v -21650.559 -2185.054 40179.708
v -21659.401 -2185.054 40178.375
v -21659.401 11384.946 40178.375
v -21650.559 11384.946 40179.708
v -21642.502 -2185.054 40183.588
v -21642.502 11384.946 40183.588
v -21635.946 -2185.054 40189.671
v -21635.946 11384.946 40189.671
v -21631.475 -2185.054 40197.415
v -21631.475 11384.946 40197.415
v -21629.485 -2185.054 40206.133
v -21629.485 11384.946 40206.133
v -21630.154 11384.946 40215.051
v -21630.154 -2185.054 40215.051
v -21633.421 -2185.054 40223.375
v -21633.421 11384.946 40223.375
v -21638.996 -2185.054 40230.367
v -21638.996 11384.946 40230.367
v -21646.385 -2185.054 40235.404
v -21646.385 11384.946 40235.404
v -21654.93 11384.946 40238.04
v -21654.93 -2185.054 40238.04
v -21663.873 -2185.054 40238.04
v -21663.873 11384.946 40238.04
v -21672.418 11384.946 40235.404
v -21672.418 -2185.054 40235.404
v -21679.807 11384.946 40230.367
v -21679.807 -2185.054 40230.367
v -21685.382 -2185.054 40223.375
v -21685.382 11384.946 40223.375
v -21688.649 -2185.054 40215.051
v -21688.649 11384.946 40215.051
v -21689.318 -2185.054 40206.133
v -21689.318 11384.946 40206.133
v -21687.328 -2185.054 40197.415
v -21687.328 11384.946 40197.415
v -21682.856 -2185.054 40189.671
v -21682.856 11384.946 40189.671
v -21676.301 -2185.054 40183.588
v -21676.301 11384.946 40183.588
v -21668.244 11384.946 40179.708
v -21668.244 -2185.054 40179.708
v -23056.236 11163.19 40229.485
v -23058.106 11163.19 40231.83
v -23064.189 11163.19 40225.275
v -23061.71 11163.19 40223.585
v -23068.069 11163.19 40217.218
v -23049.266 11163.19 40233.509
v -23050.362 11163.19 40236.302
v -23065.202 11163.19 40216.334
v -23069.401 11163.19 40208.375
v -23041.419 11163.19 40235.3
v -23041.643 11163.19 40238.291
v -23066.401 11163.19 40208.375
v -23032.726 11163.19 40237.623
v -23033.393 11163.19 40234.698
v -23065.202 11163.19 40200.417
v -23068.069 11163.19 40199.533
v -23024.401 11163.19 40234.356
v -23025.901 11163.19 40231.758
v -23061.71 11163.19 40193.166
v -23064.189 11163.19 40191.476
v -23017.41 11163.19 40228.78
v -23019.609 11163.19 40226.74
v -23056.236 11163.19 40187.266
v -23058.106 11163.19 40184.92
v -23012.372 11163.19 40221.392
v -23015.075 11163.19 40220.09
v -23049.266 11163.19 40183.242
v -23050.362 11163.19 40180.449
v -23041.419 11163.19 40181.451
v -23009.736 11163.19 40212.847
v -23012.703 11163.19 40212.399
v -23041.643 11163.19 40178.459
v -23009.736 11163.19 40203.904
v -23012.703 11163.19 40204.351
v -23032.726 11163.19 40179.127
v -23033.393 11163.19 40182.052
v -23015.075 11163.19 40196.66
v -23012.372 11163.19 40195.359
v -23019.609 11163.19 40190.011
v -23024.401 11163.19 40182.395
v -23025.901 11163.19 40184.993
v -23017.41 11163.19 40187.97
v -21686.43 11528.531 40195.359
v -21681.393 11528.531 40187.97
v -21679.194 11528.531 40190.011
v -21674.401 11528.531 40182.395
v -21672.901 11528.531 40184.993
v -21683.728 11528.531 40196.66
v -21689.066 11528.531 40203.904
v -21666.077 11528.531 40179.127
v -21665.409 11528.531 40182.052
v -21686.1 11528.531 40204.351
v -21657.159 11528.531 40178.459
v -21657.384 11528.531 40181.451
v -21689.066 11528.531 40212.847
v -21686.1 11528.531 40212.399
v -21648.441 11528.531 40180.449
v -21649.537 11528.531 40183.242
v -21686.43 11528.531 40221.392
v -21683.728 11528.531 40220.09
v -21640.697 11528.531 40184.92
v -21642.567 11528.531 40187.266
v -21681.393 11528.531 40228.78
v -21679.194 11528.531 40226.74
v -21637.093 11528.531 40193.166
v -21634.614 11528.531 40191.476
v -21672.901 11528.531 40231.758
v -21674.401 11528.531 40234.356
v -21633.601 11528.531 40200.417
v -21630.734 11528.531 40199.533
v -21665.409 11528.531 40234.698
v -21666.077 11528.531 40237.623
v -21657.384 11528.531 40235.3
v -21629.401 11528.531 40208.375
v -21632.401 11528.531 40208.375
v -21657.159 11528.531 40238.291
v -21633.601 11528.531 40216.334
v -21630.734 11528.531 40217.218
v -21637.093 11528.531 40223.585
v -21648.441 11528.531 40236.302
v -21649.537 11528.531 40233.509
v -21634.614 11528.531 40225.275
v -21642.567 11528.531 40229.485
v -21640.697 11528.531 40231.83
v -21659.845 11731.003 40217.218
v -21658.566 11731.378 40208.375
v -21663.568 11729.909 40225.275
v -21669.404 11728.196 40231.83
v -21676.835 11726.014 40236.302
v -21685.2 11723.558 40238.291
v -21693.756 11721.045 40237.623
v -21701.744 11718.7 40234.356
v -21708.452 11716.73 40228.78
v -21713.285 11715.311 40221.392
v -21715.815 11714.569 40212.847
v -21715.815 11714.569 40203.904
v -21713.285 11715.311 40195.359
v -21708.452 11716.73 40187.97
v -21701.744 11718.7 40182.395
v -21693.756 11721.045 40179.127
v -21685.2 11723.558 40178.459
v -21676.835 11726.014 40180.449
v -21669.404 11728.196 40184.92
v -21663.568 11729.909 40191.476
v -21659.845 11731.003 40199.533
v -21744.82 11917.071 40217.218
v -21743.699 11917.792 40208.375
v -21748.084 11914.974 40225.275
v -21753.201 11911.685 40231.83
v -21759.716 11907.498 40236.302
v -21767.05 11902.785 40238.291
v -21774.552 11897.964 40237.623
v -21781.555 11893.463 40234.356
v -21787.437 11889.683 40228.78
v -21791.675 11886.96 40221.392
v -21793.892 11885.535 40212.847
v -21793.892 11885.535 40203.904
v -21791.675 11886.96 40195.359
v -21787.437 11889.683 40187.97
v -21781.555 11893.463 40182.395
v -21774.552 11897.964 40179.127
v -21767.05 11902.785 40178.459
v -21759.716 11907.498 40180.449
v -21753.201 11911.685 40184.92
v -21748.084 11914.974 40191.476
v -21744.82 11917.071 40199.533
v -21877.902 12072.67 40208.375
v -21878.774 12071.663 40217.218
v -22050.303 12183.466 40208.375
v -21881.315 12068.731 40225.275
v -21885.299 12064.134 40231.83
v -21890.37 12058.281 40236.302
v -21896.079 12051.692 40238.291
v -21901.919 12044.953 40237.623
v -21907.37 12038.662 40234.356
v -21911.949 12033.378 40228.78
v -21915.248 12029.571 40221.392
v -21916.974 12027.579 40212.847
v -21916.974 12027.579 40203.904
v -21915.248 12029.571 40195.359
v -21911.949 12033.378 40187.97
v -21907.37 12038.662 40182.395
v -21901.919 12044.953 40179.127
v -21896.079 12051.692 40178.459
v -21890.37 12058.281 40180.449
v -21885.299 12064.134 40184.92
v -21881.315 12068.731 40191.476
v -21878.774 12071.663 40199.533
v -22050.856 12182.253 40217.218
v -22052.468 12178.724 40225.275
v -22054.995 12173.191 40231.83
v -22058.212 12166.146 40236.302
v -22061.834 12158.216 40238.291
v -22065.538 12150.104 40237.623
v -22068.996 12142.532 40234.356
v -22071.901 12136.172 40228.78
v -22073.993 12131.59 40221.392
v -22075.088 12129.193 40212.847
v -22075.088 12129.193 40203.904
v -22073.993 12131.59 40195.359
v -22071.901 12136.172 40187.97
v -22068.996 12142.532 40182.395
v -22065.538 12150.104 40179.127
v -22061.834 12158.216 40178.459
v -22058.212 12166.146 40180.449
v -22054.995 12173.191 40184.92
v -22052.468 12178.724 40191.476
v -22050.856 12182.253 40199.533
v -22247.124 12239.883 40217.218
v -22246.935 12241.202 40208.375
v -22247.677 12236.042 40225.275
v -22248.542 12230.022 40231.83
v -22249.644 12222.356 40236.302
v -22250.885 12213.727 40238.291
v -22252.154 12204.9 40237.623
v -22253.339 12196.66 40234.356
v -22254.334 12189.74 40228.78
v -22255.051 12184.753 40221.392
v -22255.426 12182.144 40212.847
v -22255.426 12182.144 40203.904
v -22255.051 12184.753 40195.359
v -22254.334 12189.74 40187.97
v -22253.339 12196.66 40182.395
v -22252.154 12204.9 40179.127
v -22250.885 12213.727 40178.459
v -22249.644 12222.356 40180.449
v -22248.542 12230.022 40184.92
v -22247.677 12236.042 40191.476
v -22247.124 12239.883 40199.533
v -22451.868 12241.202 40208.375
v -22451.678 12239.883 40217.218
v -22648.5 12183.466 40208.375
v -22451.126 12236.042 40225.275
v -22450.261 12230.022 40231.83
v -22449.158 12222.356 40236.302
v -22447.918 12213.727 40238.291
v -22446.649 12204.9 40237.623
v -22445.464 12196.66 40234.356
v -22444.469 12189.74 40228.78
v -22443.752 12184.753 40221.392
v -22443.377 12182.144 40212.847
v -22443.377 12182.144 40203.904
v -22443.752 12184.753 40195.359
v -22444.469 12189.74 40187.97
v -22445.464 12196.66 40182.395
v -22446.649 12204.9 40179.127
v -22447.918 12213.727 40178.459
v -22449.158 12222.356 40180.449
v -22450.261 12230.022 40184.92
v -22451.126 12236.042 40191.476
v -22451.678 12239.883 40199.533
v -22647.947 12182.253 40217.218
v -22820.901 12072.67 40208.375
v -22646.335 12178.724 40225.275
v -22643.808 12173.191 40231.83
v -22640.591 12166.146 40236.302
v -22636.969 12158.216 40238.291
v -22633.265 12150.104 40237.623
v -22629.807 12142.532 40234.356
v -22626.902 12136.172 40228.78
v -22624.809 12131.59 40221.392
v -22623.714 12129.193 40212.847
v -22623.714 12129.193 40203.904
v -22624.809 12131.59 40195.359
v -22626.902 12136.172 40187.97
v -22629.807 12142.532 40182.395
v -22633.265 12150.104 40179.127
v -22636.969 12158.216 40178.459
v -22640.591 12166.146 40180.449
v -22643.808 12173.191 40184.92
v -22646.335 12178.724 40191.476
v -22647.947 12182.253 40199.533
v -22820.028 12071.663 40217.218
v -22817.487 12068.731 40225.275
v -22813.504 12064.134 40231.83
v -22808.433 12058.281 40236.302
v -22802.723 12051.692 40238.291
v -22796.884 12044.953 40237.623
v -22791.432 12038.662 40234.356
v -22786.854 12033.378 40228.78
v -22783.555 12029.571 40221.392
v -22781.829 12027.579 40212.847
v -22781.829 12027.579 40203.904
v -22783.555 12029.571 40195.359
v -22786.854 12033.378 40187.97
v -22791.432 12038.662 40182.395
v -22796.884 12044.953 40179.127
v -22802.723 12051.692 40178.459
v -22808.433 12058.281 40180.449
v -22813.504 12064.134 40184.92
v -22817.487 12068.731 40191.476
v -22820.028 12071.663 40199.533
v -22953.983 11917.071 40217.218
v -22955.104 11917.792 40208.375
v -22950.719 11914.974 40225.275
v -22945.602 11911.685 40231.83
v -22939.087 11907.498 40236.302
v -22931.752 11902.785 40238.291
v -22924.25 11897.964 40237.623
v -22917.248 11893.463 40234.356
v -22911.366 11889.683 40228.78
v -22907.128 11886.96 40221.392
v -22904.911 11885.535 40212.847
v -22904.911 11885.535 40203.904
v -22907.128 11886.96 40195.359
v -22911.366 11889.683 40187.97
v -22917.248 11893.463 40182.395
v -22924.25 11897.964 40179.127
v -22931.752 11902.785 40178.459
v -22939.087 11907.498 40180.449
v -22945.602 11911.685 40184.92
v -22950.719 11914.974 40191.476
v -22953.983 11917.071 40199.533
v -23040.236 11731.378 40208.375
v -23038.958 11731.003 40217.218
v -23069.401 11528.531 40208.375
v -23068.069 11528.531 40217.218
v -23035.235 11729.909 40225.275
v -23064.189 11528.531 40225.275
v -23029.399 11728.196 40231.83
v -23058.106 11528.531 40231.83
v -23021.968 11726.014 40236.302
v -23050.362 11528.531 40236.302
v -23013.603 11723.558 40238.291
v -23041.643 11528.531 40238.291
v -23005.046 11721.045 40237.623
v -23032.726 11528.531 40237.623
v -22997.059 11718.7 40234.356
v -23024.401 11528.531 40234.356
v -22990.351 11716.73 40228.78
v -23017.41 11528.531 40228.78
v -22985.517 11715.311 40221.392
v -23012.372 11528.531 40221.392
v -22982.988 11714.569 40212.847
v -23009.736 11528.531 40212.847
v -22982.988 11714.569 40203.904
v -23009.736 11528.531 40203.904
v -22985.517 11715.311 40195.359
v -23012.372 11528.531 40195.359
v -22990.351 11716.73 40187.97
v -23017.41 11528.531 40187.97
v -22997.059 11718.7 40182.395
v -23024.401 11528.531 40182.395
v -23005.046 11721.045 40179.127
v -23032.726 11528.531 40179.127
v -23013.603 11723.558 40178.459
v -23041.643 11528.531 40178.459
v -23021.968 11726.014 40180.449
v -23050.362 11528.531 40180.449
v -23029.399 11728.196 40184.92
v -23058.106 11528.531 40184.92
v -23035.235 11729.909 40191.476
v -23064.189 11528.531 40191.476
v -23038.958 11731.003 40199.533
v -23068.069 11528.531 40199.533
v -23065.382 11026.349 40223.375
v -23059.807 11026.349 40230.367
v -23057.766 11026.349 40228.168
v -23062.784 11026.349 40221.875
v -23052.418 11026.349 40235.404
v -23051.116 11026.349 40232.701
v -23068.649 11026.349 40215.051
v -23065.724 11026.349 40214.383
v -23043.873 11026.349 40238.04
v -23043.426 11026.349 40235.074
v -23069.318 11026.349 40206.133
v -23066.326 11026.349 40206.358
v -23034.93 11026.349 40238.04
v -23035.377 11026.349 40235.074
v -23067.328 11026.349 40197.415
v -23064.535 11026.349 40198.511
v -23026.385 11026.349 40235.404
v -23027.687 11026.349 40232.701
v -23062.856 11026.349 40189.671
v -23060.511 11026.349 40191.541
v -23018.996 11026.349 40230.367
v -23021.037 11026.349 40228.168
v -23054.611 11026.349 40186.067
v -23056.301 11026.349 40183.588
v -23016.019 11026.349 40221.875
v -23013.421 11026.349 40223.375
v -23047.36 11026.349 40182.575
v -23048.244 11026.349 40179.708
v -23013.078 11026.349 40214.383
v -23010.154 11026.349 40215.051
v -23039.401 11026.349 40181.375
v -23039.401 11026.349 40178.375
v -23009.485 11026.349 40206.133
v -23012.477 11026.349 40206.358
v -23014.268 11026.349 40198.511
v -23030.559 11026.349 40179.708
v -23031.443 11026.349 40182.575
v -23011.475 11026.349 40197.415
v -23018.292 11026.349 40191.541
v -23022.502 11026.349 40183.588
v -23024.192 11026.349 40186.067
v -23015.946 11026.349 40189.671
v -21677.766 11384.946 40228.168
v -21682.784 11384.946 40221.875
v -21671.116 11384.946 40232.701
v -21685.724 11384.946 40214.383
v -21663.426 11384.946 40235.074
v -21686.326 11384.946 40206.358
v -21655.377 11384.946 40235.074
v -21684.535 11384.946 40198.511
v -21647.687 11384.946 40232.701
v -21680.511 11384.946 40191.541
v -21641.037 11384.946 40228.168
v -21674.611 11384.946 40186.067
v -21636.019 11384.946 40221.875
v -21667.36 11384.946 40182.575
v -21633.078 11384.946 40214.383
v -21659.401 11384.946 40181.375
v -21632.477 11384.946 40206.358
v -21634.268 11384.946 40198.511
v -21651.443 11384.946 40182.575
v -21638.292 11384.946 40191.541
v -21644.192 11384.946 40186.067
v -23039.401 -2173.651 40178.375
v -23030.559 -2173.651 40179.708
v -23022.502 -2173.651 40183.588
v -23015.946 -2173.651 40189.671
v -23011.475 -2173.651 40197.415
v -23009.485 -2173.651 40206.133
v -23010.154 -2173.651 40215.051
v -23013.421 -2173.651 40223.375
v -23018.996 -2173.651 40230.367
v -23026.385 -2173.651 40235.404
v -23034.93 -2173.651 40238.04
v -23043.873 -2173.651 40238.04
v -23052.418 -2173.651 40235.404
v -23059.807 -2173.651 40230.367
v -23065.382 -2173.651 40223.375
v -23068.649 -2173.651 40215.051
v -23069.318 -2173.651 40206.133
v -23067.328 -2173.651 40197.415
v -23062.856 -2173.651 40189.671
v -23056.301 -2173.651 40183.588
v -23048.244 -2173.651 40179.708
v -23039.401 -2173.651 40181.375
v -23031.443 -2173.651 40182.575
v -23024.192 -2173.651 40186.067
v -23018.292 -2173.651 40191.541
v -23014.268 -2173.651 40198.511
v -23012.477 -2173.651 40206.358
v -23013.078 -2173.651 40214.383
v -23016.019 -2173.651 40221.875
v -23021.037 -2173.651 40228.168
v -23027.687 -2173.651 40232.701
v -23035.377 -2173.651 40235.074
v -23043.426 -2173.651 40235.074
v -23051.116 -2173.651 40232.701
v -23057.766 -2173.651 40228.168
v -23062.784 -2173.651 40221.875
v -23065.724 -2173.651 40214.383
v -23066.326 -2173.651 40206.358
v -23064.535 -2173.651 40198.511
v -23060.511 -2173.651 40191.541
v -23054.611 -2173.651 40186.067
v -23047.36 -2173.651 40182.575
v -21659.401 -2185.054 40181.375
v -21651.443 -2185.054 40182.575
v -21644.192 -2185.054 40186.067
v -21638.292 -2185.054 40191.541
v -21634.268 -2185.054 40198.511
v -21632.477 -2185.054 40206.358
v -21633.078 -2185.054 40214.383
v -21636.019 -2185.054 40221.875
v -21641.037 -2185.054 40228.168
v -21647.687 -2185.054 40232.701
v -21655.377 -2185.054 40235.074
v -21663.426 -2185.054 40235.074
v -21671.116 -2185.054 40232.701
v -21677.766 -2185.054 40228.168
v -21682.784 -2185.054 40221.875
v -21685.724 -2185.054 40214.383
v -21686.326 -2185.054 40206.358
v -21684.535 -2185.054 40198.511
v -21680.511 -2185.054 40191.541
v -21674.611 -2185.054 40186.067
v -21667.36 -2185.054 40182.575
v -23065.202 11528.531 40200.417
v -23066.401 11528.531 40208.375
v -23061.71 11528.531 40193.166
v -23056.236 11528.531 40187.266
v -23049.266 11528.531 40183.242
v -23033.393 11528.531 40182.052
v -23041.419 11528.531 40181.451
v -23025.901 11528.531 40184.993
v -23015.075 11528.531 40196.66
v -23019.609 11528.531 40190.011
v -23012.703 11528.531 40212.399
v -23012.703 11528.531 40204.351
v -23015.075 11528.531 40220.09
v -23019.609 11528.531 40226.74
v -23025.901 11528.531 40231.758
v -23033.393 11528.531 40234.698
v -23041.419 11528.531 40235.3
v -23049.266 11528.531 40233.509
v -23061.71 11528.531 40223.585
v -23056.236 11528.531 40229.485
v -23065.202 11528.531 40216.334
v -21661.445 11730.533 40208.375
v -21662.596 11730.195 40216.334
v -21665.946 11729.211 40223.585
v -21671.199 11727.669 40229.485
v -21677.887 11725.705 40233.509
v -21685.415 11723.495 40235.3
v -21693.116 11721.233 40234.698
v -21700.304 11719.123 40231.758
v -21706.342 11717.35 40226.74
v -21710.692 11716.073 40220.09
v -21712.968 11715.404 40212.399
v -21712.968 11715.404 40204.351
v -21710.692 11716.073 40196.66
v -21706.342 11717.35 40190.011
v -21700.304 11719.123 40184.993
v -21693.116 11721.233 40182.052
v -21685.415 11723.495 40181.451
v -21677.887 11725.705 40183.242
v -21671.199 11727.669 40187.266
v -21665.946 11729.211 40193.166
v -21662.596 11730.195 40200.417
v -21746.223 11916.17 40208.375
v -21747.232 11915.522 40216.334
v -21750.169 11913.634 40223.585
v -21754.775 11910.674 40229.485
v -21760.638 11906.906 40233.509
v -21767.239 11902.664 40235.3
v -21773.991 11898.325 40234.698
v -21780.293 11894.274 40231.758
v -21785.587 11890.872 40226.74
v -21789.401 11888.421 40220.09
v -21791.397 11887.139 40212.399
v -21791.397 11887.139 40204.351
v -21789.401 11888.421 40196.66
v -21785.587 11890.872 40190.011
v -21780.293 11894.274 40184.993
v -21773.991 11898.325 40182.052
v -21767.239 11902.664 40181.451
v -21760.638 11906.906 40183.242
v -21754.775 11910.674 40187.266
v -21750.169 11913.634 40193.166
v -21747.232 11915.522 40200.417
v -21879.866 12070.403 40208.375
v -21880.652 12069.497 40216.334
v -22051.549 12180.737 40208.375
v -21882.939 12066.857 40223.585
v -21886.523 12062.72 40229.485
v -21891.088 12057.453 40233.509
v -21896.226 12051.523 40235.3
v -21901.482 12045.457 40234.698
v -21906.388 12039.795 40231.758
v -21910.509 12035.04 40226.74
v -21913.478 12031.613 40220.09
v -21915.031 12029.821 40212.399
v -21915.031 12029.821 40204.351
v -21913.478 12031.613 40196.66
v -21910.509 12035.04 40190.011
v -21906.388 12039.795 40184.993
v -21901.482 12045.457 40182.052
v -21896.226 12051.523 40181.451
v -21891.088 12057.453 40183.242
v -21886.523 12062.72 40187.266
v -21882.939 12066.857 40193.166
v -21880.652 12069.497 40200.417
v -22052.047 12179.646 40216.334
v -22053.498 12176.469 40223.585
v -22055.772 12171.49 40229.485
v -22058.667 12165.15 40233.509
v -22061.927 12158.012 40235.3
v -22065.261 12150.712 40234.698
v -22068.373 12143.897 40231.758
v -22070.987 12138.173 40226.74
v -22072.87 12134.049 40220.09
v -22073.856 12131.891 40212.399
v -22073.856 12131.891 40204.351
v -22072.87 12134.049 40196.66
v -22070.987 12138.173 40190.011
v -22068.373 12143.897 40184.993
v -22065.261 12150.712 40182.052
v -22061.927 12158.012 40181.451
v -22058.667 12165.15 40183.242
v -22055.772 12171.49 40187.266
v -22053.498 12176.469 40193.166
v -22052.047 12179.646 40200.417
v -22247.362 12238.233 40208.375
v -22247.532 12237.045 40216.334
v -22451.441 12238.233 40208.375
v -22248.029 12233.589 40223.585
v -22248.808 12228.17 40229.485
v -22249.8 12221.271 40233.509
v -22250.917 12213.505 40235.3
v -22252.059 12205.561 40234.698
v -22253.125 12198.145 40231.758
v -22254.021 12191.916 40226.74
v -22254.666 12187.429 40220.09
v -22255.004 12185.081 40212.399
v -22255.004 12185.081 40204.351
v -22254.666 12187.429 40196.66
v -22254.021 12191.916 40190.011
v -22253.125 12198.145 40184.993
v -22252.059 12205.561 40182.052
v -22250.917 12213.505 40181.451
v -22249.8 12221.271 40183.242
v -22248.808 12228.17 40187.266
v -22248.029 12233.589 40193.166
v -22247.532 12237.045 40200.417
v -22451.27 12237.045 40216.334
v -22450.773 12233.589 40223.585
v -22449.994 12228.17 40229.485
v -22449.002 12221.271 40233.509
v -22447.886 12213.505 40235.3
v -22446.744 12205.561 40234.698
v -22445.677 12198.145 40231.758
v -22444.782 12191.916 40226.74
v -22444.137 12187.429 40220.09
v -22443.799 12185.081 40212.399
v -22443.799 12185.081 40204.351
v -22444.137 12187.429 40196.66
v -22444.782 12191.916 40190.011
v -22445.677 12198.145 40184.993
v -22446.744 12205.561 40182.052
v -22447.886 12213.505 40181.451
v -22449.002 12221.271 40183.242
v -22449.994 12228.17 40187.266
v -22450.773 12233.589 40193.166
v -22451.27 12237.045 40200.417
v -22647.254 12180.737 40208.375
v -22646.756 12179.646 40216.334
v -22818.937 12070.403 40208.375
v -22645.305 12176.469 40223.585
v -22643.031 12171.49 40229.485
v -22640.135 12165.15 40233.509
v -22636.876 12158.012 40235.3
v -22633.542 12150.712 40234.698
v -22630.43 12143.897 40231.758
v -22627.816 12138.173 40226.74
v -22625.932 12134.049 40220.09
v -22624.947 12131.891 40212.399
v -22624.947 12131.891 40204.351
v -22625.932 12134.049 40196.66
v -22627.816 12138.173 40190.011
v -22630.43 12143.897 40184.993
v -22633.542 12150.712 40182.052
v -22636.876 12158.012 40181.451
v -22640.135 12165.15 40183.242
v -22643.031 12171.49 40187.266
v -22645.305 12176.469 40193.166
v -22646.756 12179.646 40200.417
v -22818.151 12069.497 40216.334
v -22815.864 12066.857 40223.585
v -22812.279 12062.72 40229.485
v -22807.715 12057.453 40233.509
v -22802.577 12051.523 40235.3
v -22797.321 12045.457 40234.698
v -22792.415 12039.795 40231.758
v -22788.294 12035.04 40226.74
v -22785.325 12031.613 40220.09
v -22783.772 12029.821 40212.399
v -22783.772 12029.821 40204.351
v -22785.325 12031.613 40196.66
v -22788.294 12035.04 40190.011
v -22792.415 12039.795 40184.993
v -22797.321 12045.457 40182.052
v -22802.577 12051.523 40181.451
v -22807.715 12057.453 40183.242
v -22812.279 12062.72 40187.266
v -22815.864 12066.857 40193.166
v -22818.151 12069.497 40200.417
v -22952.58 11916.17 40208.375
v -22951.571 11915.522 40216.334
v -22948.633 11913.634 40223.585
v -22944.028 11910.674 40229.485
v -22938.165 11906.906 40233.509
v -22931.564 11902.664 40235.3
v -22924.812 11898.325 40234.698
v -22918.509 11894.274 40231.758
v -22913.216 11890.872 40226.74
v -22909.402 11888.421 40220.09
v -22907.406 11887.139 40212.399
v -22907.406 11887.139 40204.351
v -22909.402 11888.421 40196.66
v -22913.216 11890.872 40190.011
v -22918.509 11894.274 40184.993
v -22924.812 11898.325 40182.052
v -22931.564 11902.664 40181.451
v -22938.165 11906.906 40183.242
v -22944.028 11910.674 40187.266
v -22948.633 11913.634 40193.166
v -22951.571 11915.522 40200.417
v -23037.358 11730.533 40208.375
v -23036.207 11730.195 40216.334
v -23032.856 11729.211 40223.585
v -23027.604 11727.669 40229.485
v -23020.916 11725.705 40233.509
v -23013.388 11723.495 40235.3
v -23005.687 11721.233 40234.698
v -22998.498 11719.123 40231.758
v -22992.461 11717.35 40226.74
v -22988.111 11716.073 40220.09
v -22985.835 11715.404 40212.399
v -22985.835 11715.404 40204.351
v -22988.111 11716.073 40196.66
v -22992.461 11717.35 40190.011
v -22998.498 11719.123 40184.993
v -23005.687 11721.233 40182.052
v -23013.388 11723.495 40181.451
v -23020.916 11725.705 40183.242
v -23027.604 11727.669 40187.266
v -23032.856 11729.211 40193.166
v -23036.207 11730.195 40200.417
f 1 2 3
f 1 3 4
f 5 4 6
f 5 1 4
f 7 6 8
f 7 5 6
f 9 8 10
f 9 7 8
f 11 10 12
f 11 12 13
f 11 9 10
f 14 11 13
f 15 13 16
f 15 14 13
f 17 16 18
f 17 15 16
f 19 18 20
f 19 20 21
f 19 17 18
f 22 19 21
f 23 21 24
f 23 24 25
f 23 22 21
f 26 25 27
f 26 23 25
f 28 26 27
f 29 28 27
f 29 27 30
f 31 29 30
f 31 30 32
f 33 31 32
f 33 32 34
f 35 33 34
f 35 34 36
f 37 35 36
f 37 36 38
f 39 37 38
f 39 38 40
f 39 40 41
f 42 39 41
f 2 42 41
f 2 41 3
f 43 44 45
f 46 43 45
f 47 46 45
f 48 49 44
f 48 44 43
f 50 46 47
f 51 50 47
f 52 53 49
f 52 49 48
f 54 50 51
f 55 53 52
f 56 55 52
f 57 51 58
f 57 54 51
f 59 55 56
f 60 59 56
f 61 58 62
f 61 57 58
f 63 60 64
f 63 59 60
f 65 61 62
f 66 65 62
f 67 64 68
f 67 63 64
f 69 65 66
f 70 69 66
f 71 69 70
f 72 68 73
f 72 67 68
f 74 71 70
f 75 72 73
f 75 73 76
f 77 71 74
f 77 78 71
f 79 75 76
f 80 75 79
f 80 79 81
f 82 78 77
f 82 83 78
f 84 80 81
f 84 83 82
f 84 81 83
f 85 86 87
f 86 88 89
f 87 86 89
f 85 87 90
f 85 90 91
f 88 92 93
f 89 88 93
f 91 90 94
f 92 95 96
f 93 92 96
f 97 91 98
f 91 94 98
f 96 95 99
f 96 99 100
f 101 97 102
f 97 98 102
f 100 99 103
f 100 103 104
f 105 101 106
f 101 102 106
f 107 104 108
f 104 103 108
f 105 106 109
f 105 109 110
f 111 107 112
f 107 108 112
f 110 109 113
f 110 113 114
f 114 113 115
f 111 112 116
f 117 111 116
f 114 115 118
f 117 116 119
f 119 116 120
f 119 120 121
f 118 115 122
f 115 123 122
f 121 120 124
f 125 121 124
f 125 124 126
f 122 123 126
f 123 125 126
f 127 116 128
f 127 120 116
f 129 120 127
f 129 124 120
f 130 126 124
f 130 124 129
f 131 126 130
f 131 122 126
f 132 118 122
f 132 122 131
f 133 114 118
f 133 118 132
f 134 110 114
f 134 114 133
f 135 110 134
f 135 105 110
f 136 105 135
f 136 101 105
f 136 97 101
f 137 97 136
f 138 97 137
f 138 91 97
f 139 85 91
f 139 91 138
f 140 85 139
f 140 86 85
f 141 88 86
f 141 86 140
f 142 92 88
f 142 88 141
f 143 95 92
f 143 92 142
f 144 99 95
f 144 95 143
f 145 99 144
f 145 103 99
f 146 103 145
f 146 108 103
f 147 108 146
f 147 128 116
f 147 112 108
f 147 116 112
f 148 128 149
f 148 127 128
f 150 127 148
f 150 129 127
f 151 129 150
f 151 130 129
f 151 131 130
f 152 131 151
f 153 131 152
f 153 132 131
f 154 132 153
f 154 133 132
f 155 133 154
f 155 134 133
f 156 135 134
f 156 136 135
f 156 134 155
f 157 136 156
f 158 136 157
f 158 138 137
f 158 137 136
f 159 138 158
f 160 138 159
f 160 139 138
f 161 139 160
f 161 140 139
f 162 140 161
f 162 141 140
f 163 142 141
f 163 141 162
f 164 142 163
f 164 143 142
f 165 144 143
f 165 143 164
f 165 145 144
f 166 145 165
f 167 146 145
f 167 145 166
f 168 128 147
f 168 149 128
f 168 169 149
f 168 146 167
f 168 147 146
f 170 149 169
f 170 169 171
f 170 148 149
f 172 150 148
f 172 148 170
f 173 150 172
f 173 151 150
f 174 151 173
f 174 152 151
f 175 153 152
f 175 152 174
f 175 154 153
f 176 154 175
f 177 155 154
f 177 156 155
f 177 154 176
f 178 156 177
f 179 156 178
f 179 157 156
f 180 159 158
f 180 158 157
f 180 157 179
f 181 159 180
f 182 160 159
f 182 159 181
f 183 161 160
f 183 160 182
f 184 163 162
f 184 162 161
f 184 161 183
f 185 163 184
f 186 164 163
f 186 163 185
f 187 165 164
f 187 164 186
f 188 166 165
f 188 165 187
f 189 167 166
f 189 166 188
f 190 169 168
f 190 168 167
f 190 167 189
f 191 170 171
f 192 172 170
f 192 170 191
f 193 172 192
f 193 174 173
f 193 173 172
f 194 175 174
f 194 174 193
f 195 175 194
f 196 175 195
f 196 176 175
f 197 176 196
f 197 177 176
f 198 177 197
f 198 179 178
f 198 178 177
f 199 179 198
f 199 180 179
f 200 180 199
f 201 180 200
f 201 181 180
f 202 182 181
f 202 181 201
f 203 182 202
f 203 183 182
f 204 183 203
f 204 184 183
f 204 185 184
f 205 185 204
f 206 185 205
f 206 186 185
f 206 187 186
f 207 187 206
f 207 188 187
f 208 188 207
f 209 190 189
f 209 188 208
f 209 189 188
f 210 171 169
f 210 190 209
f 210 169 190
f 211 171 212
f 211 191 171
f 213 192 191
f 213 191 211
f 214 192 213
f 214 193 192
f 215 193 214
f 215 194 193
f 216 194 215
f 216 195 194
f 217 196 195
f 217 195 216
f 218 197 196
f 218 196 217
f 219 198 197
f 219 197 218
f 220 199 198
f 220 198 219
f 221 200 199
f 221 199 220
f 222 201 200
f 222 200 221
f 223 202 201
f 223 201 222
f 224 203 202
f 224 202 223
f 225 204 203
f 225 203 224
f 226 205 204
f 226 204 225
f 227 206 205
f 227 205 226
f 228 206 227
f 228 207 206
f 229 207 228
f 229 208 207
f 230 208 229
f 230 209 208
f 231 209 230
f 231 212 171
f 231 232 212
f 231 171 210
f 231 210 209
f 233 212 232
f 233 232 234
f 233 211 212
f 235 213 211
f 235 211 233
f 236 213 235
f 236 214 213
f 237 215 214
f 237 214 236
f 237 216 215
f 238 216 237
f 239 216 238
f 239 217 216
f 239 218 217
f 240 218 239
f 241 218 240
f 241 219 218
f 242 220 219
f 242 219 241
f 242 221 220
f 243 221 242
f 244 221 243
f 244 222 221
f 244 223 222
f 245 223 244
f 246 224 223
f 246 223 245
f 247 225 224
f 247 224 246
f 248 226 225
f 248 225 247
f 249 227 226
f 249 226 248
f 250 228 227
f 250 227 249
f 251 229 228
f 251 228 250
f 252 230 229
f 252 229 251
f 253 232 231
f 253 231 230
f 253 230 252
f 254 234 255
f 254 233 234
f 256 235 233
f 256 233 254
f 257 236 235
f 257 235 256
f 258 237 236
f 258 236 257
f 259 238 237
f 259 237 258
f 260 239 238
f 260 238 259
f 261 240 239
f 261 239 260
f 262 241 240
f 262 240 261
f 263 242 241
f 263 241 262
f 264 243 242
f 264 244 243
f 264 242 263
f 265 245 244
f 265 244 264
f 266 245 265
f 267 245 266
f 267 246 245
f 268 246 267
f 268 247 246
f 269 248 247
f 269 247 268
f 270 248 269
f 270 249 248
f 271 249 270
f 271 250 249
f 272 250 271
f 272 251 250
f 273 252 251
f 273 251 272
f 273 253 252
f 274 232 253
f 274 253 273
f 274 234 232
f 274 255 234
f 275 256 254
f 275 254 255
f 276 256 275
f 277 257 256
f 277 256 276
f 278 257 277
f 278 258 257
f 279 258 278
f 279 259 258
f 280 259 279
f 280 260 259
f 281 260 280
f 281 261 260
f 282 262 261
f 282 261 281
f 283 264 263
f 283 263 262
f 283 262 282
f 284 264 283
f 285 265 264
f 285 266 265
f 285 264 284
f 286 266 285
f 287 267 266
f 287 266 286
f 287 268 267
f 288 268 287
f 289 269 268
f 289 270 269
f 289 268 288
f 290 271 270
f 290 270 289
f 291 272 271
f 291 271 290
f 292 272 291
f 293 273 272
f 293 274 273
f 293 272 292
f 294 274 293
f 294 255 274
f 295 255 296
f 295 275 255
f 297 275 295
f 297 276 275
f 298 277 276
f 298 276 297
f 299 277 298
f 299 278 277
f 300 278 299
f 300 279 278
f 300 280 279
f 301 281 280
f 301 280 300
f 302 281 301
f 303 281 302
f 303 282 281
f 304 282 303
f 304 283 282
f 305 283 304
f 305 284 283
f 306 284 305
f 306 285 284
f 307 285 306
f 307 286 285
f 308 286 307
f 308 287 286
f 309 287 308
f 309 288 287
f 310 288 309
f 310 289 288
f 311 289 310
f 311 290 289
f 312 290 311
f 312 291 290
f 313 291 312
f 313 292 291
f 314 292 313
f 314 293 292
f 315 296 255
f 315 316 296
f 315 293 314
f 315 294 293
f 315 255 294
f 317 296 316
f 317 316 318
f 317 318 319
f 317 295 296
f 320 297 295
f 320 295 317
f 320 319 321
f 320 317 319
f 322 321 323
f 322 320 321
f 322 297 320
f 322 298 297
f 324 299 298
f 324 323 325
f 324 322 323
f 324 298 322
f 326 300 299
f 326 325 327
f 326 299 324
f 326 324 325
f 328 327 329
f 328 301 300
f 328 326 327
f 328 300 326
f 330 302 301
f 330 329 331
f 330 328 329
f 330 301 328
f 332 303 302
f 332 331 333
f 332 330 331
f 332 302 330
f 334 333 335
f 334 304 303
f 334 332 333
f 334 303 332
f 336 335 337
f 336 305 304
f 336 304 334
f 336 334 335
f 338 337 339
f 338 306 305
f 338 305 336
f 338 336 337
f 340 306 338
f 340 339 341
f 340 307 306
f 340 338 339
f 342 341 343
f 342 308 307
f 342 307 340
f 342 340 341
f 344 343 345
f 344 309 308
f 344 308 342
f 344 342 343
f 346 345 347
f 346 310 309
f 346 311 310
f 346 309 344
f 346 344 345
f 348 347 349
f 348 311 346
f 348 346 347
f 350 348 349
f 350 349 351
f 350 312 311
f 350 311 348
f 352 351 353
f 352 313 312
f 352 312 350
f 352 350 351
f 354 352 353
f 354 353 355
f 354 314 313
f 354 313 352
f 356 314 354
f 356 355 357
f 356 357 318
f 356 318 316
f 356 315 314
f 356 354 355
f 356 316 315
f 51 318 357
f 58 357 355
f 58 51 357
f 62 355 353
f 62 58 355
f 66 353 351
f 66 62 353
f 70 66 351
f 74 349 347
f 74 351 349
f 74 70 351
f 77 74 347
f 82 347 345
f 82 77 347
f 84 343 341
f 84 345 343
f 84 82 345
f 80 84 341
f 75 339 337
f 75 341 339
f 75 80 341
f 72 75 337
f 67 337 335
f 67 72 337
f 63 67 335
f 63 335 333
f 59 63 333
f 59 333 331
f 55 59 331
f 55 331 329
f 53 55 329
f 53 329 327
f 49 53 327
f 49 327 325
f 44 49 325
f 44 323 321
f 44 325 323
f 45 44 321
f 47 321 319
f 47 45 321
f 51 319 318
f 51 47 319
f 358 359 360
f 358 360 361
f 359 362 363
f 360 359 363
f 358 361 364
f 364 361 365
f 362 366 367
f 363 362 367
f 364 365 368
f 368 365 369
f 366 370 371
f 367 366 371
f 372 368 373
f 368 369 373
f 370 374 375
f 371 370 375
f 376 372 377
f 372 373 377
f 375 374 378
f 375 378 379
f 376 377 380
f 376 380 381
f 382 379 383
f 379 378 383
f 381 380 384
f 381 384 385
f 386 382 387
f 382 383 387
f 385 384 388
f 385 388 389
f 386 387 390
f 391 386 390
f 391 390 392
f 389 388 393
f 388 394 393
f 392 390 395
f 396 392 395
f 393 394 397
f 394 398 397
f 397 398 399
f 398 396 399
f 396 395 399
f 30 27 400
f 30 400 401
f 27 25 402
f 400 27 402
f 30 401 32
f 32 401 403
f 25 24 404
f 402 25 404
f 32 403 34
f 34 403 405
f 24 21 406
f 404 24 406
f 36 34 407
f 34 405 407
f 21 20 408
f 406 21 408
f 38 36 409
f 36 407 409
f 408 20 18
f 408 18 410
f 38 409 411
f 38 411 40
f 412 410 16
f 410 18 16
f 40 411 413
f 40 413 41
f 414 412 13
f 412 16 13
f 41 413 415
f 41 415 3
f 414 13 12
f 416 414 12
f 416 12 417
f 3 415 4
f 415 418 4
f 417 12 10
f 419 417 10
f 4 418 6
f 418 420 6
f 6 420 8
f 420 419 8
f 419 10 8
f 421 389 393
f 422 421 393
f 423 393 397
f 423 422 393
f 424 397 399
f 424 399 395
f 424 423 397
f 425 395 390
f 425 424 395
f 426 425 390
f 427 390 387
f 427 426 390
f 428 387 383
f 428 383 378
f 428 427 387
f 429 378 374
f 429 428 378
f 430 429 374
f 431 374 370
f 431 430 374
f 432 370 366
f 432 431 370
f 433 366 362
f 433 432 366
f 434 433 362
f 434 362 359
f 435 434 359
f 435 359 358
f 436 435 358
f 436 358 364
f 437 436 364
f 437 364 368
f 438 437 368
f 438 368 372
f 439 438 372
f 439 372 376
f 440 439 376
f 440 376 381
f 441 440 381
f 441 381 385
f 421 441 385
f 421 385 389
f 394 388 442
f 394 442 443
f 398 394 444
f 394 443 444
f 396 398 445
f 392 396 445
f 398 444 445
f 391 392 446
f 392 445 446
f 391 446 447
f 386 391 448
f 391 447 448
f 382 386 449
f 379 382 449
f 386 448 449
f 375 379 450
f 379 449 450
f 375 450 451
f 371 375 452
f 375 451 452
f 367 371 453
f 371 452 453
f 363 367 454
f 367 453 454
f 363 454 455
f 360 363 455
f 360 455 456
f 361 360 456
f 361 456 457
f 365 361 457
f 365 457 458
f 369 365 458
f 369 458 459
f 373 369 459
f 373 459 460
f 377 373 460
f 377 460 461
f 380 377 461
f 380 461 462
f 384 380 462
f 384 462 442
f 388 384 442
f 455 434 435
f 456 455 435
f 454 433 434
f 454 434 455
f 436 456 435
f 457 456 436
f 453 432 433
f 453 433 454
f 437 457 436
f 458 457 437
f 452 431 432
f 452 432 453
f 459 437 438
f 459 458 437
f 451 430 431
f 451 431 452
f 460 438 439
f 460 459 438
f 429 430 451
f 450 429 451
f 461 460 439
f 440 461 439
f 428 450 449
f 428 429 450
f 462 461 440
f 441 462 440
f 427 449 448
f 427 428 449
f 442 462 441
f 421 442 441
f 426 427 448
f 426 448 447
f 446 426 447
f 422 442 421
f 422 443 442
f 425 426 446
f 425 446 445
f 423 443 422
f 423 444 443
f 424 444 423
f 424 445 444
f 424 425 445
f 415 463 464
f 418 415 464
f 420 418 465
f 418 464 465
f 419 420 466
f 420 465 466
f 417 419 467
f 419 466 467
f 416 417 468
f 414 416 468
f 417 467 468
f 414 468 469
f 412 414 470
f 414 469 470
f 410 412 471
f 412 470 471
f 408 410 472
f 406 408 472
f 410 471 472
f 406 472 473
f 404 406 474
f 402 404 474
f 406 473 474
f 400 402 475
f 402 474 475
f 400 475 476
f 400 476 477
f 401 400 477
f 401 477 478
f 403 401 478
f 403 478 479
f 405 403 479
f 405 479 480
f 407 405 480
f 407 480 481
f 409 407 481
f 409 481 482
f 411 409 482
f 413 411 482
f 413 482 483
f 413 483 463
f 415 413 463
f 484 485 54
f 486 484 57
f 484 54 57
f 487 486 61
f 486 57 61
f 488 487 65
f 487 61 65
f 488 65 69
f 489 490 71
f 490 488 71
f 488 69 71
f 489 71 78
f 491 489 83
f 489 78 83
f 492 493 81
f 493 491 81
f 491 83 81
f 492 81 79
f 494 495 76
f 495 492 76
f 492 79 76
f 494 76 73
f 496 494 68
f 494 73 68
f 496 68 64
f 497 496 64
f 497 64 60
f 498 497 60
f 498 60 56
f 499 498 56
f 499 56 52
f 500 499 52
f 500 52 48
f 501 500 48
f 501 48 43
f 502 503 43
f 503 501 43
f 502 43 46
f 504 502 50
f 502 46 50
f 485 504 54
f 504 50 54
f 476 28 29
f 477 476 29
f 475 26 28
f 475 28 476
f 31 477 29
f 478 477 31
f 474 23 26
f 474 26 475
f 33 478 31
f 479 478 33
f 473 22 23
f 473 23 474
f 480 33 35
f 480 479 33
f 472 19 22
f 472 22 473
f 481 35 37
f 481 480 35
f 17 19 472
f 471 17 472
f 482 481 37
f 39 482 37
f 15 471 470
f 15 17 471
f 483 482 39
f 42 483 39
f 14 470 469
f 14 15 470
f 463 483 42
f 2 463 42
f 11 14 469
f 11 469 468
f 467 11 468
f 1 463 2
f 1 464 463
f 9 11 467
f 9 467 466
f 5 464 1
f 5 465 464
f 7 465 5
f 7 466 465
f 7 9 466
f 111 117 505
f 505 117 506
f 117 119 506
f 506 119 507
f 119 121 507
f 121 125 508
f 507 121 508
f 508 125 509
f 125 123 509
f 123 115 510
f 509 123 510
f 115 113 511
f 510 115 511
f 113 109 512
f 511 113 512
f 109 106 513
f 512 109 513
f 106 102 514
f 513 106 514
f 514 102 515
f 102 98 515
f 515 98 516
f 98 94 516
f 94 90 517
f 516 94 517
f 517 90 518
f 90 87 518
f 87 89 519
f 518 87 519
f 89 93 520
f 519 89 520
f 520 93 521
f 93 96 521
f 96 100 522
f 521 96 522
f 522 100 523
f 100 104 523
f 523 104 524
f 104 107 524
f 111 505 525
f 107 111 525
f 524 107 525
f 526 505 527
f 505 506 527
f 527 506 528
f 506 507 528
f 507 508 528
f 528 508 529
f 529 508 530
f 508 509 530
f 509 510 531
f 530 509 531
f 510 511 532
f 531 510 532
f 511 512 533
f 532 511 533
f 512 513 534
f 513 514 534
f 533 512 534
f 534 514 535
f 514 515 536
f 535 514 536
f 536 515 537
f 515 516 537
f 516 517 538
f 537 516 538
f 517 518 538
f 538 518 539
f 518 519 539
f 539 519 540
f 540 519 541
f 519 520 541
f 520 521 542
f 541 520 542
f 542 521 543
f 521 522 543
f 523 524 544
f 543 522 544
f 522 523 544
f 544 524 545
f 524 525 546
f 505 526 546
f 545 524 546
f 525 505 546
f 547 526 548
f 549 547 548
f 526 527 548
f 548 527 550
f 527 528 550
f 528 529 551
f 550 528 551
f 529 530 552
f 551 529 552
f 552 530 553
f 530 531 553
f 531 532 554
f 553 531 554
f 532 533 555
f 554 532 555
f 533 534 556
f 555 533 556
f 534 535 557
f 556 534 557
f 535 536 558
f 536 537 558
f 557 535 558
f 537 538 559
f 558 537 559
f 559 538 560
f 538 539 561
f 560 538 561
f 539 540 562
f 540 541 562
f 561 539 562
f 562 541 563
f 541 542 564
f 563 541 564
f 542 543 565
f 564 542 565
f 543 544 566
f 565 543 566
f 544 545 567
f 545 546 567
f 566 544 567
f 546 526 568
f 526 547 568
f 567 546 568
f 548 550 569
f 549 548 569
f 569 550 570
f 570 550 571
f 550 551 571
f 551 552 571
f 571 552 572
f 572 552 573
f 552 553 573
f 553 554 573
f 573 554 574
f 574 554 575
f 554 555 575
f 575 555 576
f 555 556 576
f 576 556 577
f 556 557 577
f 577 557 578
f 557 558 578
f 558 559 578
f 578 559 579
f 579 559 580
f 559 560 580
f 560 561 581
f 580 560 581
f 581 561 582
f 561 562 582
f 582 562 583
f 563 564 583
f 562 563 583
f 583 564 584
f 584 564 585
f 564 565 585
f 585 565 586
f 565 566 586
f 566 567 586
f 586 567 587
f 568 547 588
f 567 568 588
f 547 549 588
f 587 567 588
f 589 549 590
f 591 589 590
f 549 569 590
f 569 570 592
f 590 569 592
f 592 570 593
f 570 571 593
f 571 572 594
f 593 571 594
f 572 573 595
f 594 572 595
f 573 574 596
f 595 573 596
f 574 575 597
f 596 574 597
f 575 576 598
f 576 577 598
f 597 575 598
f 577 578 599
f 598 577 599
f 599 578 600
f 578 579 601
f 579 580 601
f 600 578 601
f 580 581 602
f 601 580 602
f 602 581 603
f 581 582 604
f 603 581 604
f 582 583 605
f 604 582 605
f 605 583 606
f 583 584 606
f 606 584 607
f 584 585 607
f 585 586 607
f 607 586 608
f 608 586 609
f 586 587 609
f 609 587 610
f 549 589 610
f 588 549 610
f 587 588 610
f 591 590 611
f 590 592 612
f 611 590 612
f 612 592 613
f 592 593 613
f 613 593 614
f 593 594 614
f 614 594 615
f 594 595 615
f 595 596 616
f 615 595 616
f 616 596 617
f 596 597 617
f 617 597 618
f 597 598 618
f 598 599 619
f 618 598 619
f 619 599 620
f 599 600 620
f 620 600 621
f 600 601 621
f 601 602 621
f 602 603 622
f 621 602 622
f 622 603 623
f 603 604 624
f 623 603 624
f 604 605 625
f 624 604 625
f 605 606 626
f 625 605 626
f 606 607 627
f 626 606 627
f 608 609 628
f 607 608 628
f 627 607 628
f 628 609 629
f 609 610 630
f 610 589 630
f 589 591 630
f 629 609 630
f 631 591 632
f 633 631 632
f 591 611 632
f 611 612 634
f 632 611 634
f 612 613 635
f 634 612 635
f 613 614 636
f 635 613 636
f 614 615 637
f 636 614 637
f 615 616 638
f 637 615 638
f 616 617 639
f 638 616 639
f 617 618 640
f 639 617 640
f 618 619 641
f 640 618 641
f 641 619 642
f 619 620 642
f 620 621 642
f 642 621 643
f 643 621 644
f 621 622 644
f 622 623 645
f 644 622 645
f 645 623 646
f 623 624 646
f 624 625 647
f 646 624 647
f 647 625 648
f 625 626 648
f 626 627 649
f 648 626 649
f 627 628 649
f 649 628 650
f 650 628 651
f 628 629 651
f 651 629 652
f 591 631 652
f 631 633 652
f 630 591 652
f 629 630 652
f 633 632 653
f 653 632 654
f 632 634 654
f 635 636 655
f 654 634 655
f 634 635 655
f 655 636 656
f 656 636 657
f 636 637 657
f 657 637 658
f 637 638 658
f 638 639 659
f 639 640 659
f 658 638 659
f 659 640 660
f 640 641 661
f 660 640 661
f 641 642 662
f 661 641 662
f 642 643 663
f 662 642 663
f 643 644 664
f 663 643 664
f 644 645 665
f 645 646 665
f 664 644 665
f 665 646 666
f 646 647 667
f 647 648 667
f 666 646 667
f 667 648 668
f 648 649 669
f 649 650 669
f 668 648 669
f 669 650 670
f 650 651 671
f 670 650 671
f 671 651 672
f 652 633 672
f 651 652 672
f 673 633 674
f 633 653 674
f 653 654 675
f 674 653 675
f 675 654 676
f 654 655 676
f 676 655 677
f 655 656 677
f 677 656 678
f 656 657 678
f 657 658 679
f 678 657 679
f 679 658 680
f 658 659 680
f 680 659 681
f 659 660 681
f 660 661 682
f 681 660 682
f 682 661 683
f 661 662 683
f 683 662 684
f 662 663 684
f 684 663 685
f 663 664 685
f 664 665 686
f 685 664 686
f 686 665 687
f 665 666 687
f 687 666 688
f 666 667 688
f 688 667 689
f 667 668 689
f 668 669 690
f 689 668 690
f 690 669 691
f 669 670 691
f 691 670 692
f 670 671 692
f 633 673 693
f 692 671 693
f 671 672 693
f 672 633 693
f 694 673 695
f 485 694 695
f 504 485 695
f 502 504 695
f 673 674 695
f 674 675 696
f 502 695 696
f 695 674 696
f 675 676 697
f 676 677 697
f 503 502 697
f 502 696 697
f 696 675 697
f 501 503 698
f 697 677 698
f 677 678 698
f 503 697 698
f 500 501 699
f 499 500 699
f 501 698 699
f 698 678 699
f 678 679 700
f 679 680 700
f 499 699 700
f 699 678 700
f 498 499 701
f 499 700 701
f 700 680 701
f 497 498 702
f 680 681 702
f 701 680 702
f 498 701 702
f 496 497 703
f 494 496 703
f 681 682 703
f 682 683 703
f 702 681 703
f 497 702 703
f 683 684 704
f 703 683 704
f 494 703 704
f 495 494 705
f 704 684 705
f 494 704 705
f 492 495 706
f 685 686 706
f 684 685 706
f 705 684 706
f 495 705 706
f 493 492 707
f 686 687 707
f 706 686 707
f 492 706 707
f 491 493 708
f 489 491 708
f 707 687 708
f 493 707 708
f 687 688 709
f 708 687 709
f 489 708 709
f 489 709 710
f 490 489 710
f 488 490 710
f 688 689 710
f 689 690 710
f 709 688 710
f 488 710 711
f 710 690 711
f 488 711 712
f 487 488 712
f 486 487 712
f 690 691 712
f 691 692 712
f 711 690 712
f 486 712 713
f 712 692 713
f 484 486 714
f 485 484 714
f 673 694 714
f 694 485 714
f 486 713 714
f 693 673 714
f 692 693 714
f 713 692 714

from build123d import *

# Parameters (mm, degrees)
SWEEP_THIN1_PROFILE_R   = 30
SWEEP_THIN1_PROFILE_R_2 = 27
SWEEP_THIN3_PROFILE_R   = 30
SWEEP_THIN3_PROFILE_R_2 = 27
SWEEP_THIN4_PROFILE_R   = 30
SWEEP_THIN4_PROFILE_R_2 = 27


with BuildPart() as part:
    # Sweep-Thin1: sweep along a curve in space
    with BuildLine() as sweep_thin1_path:
        Line((-23039.401391801, 11528.530628552, 40208.375315098), (-23039.401391801, 11163.190412186, 40208.375315098))
        ThreePointArc((-23039.401391801, 11528.530628552, 40208.375315098), (-22349.401391801, 12218.530628552, 40208.375315098), (-21659.401391801, 11528.530628552, 40208.375315098))
    # Sweep-Thin1 profile (on start of the path) → Sweep-Thin1 (sweep)
    with BuildSketch(Plane(origin=(-21659.401391801, 11528.530628552, 40208.375315098), x_dir=(1, 0, 0), z_dir=(0, 1, 0))):
        Circle(SWEEP_THIN1_PROFILE_R)
        Circle(SWEEP_THIN1_PROFILE_R_2, mode=Mode.SUBTRACT)
    sweep(path=sweep_thin1_path.line)


with BuildPart() as body_2:
    # Sweep-Thin3: sweep along a curve in space
    with BuildLine() as sweep_thin3_path:
        Line((-21659.401391801, 11384.945711664, 40208.375315098), (-21659.401391801, -2185.054288336, 40208.375315098))
    # Sweep-Thin3 profile (on start of the path) → Sweep-Thin3 (sweep)
    with BuildSketch(Plane(origin=(-21659.401391801, 11384.945711664, 40208.375315098), x_dir=(0, 0, -1), z_dir=(0, -1, 0))):
        Circle(SWEEP_THIN3_PROFILE_R)
        Circle(SWEEP_THIN3_PROFILE_R_2, mode=Mode.SUBTRACT)
    sweep(path=sweep_thin3_path.line)


with BuildPart() as body_3:
    # Sweep-Thin4: sweep along a curve in space
    with BuildLine() as sweep_thin4_path:
        Line((-23039.401391872, 11026.348648105, 40208.375307126), (-23039.401391872, -2173.651351895, 40208.375307126))
    # Sweep-Thin4 profile (on start of the path) → Sweep-Thin4 (sweep)
    with BuildSketch(Plane(origin=(-23039.401391872, 11026.348648105, 40208.375307126), x_dir=(0, 0, -1), z_dir=(0, -1, 0))):
        Circle(SWEEP_THIN4_PROFILE_R)
        Circle(SWEEP_THIN4_PROFILE_R_2, mode=Mode.SUBTRACT)
    sweep(path=sweep_thin4_path.line)


solid = Compound([part.part, body_2.part, body_3.part])
